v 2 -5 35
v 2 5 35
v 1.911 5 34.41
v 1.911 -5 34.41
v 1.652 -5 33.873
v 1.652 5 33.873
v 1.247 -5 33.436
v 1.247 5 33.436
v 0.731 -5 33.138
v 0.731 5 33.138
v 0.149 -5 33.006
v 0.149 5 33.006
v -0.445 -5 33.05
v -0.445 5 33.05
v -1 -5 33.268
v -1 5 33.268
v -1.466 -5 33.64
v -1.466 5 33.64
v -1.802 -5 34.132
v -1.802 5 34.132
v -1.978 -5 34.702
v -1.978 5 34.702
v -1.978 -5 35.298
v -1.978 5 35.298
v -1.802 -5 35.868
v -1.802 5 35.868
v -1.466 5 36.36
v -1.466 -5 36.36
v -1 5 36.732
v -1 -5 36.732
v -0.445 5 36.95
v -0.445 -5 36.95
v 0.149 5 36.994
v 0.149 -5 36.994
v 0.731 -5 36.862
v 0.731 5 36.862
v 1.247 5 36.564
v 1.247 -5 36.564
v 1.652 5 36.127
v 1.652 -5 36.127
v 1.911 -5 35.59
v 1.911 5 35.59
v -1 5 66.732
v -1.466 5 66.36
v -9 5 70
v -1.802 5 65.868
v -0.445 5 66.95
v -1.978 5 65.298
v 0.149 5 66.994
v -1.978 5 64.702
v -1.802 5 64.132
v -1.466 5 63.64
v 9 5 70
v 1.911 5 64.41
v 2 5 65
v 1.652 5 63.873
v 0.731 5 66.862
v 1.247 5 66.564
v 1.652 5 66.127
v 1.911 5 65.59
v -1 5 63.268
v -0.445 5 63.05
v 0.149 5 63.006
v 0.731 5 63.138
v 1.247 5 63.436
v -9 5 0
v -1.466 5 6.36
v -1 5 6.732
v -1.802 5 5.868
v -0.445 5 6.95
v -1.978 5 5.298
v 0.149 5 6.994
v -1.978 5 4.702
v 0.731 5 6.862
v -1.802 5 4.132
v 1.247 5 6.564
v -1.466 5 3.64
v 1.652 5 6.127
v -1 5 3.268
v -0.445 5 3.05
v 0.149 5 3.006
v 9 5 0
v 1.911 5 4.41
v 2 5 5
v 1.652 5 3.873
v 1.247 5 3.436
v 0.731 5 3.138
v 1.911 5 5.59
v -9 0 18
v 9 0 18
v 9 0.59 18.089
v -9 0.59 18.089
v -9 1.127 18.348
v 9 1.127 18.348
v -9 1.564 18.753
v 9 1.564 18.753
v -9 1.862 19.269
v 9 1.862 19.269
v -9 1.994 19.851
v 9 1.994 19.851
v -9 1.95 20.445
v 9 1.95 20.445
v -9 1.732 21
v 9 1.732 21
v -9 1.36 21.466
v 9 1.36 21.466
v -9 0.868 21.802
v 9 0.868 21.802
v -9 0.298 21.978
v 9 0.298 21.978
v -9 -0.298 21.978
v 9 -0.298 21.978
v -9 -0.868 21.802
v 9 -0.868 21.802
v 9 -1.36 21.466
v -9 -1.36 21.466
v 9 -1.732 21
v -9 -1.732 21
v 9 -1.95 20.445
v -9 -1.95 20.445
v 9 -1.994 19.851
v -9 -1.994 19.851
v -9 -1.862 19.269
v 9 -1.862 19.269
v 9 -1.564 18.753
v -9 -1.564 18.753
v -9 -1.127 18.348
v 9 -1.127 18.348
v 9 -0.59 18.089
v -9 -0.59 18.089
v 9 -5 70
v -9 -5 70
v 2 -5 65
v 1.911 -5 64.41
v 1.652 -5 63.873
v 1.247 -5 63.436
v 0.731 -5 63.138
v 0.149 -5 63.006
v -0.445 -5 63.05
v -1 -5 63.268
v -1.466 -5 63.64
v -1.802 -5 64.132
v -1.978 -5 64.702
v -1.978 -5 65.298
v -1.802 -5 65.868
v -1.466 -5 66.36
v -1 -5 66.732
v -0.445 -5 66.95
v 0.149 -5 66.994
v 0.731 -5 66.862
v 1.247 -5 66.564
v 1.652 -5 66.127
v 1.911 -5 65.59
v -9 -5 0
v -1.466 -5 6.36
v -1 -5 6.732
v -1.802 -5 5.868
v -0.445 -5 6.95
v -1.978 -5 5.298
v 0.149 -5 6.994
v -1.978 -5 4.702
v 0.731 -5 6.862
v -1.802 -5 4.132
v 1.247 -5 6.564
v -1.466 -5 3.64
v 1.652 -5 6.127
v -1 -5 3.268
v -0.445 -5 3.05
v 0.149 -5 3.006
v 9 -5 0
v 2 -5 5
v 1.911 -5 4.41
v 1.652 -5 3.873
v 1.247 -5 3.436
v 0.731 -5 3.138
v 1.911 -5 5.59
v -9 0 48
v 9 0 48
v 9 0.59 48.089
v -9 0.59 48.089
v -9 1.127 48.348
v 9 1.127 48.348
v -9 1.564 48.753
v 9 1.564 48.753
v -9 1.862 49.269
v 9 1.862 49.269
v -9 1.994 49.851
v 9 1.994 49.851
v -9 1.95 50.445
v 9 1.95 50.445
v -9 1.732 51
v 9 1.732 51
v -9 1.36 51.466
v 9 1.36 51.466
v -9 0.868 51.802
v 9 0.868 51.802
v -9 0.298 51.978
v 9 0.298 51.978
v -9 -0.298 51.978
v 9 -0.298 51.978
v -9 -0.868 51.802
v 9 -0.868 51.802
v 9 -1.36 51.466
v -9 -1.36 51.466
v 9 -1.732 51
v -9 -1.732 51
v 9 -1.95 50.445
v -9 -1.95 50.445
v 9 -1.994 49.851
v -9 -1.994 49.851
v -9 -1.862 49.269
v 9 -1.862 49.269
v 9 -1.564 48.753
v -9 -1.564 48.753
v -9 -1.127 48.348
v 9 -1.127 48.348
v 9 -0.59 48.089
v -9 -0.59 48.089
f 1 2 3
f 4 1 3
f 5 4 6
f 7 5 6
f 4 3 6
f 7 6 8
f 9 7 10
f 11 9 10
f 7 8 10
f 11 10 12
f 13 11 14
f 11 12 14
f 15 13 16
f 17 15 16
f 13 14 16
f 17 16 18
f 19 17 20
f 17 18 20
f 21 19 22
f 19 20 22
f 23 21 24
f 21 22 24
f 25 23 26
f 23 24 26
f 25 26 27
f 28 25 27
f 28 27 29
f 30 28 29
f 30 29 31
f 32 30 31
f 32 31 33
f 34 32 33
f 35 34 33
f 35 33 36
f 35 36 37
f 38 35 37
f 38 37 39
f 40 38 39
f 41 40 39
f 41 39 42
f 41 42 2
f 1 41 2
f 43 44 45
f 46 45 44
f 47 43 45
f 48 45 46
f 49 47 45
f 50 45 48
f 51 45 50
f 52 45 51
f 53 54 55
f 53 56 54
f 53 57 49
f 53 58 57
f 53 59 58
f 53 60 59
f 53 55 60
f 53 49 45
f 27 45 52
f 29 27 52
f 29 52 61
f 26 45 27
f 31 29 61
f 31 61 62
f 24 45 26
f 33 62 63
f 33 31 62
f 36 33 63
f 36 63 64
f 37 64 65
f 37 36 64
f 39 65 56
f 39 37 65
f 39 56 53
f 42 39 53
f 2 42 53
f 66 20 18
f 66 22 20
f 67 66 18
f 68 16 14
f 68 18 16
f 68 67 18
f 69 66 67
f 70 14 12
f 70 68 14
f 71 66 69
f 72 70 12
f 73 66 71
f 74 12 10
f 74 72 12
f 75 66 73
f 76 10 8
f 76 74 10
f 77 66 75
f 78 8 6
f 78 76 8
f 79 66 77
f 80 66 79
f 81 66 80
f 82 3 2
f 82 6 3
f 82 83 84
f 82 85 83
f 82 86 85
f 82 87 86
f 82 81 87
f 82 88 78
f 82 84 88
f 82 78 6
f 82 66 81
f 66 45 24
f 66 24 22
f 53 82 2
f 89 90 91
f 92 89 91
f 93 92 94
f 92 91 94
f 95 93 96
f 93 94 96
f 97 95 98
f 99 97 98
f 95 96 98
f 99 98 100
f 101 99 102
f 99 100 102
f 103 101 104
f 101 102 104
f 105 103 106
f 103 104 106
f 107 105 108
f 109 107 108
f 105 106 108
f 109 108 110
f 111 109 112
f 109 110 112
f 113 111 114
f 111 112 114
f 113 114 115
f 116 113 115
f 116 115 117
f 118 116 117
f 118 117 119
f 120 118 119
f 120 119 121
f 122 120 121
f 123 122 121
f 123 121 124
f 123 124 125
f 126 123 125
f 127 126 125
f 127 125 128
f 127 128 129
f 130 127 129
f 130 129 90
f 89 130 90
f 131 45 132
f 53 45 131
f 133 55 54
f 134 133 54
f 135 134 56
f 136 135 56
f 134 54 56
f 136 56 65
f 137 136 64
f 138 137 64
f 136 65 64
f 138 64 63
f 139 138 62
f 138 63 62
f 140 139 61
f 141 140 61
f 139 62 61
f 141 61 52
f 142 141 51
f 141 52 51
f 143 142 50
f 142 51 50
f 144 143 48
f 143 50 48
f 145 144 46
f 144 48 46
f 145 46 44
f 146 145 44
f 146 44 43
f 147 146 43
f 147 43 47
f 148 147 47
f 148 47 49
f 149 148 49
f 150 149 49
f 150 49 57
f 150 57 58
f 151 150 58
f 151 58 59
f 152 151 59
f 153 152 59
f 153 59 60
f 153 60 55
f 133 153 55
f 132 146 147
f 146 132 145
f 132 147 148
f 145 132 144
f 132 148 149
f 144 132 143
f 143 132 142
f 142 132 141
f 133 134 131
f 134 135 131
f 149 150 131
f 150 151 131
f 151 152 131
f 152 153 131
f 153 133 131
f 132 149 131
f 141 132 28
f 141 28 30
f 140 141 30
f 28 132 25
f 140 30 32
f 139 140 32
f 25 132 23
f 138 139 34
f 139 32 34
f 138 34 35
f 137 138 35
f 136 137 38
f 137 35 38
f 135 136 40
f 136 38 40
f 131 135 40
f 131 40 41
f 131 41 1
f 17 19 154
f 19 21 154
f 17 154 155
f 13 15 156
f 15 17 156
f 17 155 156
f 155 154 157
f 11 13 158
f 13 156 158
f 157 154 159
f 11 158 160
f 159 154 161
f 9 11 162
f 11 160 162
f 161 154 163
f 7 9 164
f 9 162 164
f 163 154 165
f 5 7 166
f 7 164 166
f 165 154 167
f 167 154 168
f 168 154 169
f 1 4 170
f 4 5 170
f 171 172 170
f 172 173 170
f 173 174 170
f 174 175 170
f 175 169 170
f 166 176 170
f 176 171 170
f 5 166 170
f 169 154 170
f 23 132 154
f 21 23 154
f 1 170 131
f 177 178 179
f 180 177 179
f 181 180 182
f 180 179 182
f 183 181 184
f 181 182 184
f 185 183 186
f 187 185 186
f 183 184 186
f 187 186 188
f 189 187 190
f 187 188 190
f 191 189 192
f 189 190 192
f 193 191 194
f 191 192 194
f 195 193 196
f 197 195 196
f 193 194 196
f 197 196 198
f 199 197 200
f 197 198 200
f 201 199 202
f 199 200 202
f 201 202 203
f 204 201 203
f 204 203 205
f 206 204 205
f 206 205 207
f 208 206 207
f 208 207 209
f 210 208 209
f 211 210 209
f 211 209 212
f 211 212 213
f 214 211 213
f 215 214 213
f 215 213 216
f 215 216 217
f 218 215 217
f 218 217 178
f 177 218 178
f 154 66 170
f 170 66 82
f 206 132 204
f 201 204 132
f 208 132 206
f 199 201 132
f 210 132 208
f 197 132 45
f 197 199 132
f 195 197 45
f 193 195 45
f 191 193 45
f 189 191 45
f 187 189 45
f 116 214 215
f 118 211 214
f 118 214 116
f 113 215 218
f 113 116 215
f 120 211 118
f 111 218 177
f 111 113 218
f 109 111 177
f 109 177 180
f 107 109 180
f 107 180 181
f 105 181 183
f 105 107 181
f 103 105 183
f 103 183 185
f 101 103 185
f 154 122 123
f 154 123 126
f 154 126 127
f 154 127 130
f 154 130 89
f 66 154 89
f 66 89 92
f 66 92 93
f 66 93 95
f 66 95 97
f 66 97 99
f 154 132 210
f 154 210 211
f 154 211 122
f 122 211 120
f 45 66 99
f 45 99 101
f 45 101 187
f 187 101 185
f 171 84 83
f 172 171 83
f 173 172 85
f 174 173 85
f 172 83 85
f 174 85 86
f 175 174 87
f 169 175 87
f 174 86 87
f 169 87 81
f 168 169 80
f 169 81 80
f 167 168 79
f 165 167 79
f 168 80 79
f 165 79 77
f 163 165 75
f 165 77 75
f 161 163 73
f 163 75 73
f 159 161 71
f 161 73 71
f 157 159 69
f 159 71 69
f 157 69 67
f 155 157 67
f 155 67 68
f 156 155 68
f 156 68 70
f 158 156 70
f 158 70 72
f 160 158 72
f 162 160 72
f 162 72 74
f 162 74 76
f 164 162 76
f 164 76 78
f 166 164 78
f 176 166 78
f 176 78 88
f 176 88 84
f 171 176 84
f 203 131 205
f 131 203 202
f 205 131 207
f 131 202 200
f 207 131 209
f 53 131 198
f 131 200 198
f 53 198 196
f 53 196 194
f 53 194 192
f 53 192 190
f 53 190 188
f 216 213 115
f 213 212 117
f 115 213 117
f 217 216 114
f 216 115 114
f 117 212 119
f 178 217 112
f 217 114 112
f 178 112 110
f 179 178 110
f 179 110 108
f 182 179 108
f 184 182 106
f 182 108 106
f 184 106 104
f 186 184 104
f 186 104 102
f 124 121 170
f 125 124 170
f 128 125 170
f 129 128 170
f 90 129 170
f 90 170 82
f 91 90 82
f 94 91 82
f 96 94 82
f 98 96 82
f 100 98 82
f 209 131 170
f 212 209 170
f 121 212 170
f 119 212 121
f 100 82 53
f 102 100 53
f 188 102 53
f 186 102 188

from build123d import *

# Parameters (mm, degrees)
SKETCH_1_W          = 18
SKETCH_1_H          = 10
EXTRUDE_1_DEPTH     = 70
SKETCH_2_R          = 2
CUT_EXTRUDE_1_DEPTH = 11
SKETCH_3_R          = 2
CUT_EXTRUDE_2_DEPTH = 19


with BuildPart() as part:
    # 草图1 → 凸台-拉伸1 (new body)
    with BuildSketch(Plane.XY):
        Rectangle(SKETCH_1_W, SKETCH_1_H)
    extrude(amount=EXTRUDE_1_DEPTH)

    # 草图2 → 切除-拉伸1 (cut, through all)
    with BuildSketch(Plane(origin=(0, 5, 0), x_dir=(1, 0, 0), z_dir=(0, 1, 0))):
        with Locations((0, -5)):
            Circle(SKETCH_2_R)
        with Locations((0, -35)):
            Circle(SKETCH_2_R)
        with Locations((0, -65)):
            Circle(SKETCH_2_R)
    extrude(amount=-CUT_EXTRUDE_1_DEPTH, mode=Mode.SUBTRACT)

    # 草图3 → 切除-拉伸2 (cut, through all)
    with BuildSketch(Plane(origin=(9, 0, 0), x_dir=(0, 0, -1), z_dir=(1, 0, 0))):
        with Locations((-50, 0)):
            Circle(SKETCH_3_R)
        with Locations((-20, 0)):
            Circle(SKETCH_3_R)
    extrude(amount=-CUT_EXTRUDE_2_DEPTH, mode=Mode.SUBTRACT)


solid = part.part
